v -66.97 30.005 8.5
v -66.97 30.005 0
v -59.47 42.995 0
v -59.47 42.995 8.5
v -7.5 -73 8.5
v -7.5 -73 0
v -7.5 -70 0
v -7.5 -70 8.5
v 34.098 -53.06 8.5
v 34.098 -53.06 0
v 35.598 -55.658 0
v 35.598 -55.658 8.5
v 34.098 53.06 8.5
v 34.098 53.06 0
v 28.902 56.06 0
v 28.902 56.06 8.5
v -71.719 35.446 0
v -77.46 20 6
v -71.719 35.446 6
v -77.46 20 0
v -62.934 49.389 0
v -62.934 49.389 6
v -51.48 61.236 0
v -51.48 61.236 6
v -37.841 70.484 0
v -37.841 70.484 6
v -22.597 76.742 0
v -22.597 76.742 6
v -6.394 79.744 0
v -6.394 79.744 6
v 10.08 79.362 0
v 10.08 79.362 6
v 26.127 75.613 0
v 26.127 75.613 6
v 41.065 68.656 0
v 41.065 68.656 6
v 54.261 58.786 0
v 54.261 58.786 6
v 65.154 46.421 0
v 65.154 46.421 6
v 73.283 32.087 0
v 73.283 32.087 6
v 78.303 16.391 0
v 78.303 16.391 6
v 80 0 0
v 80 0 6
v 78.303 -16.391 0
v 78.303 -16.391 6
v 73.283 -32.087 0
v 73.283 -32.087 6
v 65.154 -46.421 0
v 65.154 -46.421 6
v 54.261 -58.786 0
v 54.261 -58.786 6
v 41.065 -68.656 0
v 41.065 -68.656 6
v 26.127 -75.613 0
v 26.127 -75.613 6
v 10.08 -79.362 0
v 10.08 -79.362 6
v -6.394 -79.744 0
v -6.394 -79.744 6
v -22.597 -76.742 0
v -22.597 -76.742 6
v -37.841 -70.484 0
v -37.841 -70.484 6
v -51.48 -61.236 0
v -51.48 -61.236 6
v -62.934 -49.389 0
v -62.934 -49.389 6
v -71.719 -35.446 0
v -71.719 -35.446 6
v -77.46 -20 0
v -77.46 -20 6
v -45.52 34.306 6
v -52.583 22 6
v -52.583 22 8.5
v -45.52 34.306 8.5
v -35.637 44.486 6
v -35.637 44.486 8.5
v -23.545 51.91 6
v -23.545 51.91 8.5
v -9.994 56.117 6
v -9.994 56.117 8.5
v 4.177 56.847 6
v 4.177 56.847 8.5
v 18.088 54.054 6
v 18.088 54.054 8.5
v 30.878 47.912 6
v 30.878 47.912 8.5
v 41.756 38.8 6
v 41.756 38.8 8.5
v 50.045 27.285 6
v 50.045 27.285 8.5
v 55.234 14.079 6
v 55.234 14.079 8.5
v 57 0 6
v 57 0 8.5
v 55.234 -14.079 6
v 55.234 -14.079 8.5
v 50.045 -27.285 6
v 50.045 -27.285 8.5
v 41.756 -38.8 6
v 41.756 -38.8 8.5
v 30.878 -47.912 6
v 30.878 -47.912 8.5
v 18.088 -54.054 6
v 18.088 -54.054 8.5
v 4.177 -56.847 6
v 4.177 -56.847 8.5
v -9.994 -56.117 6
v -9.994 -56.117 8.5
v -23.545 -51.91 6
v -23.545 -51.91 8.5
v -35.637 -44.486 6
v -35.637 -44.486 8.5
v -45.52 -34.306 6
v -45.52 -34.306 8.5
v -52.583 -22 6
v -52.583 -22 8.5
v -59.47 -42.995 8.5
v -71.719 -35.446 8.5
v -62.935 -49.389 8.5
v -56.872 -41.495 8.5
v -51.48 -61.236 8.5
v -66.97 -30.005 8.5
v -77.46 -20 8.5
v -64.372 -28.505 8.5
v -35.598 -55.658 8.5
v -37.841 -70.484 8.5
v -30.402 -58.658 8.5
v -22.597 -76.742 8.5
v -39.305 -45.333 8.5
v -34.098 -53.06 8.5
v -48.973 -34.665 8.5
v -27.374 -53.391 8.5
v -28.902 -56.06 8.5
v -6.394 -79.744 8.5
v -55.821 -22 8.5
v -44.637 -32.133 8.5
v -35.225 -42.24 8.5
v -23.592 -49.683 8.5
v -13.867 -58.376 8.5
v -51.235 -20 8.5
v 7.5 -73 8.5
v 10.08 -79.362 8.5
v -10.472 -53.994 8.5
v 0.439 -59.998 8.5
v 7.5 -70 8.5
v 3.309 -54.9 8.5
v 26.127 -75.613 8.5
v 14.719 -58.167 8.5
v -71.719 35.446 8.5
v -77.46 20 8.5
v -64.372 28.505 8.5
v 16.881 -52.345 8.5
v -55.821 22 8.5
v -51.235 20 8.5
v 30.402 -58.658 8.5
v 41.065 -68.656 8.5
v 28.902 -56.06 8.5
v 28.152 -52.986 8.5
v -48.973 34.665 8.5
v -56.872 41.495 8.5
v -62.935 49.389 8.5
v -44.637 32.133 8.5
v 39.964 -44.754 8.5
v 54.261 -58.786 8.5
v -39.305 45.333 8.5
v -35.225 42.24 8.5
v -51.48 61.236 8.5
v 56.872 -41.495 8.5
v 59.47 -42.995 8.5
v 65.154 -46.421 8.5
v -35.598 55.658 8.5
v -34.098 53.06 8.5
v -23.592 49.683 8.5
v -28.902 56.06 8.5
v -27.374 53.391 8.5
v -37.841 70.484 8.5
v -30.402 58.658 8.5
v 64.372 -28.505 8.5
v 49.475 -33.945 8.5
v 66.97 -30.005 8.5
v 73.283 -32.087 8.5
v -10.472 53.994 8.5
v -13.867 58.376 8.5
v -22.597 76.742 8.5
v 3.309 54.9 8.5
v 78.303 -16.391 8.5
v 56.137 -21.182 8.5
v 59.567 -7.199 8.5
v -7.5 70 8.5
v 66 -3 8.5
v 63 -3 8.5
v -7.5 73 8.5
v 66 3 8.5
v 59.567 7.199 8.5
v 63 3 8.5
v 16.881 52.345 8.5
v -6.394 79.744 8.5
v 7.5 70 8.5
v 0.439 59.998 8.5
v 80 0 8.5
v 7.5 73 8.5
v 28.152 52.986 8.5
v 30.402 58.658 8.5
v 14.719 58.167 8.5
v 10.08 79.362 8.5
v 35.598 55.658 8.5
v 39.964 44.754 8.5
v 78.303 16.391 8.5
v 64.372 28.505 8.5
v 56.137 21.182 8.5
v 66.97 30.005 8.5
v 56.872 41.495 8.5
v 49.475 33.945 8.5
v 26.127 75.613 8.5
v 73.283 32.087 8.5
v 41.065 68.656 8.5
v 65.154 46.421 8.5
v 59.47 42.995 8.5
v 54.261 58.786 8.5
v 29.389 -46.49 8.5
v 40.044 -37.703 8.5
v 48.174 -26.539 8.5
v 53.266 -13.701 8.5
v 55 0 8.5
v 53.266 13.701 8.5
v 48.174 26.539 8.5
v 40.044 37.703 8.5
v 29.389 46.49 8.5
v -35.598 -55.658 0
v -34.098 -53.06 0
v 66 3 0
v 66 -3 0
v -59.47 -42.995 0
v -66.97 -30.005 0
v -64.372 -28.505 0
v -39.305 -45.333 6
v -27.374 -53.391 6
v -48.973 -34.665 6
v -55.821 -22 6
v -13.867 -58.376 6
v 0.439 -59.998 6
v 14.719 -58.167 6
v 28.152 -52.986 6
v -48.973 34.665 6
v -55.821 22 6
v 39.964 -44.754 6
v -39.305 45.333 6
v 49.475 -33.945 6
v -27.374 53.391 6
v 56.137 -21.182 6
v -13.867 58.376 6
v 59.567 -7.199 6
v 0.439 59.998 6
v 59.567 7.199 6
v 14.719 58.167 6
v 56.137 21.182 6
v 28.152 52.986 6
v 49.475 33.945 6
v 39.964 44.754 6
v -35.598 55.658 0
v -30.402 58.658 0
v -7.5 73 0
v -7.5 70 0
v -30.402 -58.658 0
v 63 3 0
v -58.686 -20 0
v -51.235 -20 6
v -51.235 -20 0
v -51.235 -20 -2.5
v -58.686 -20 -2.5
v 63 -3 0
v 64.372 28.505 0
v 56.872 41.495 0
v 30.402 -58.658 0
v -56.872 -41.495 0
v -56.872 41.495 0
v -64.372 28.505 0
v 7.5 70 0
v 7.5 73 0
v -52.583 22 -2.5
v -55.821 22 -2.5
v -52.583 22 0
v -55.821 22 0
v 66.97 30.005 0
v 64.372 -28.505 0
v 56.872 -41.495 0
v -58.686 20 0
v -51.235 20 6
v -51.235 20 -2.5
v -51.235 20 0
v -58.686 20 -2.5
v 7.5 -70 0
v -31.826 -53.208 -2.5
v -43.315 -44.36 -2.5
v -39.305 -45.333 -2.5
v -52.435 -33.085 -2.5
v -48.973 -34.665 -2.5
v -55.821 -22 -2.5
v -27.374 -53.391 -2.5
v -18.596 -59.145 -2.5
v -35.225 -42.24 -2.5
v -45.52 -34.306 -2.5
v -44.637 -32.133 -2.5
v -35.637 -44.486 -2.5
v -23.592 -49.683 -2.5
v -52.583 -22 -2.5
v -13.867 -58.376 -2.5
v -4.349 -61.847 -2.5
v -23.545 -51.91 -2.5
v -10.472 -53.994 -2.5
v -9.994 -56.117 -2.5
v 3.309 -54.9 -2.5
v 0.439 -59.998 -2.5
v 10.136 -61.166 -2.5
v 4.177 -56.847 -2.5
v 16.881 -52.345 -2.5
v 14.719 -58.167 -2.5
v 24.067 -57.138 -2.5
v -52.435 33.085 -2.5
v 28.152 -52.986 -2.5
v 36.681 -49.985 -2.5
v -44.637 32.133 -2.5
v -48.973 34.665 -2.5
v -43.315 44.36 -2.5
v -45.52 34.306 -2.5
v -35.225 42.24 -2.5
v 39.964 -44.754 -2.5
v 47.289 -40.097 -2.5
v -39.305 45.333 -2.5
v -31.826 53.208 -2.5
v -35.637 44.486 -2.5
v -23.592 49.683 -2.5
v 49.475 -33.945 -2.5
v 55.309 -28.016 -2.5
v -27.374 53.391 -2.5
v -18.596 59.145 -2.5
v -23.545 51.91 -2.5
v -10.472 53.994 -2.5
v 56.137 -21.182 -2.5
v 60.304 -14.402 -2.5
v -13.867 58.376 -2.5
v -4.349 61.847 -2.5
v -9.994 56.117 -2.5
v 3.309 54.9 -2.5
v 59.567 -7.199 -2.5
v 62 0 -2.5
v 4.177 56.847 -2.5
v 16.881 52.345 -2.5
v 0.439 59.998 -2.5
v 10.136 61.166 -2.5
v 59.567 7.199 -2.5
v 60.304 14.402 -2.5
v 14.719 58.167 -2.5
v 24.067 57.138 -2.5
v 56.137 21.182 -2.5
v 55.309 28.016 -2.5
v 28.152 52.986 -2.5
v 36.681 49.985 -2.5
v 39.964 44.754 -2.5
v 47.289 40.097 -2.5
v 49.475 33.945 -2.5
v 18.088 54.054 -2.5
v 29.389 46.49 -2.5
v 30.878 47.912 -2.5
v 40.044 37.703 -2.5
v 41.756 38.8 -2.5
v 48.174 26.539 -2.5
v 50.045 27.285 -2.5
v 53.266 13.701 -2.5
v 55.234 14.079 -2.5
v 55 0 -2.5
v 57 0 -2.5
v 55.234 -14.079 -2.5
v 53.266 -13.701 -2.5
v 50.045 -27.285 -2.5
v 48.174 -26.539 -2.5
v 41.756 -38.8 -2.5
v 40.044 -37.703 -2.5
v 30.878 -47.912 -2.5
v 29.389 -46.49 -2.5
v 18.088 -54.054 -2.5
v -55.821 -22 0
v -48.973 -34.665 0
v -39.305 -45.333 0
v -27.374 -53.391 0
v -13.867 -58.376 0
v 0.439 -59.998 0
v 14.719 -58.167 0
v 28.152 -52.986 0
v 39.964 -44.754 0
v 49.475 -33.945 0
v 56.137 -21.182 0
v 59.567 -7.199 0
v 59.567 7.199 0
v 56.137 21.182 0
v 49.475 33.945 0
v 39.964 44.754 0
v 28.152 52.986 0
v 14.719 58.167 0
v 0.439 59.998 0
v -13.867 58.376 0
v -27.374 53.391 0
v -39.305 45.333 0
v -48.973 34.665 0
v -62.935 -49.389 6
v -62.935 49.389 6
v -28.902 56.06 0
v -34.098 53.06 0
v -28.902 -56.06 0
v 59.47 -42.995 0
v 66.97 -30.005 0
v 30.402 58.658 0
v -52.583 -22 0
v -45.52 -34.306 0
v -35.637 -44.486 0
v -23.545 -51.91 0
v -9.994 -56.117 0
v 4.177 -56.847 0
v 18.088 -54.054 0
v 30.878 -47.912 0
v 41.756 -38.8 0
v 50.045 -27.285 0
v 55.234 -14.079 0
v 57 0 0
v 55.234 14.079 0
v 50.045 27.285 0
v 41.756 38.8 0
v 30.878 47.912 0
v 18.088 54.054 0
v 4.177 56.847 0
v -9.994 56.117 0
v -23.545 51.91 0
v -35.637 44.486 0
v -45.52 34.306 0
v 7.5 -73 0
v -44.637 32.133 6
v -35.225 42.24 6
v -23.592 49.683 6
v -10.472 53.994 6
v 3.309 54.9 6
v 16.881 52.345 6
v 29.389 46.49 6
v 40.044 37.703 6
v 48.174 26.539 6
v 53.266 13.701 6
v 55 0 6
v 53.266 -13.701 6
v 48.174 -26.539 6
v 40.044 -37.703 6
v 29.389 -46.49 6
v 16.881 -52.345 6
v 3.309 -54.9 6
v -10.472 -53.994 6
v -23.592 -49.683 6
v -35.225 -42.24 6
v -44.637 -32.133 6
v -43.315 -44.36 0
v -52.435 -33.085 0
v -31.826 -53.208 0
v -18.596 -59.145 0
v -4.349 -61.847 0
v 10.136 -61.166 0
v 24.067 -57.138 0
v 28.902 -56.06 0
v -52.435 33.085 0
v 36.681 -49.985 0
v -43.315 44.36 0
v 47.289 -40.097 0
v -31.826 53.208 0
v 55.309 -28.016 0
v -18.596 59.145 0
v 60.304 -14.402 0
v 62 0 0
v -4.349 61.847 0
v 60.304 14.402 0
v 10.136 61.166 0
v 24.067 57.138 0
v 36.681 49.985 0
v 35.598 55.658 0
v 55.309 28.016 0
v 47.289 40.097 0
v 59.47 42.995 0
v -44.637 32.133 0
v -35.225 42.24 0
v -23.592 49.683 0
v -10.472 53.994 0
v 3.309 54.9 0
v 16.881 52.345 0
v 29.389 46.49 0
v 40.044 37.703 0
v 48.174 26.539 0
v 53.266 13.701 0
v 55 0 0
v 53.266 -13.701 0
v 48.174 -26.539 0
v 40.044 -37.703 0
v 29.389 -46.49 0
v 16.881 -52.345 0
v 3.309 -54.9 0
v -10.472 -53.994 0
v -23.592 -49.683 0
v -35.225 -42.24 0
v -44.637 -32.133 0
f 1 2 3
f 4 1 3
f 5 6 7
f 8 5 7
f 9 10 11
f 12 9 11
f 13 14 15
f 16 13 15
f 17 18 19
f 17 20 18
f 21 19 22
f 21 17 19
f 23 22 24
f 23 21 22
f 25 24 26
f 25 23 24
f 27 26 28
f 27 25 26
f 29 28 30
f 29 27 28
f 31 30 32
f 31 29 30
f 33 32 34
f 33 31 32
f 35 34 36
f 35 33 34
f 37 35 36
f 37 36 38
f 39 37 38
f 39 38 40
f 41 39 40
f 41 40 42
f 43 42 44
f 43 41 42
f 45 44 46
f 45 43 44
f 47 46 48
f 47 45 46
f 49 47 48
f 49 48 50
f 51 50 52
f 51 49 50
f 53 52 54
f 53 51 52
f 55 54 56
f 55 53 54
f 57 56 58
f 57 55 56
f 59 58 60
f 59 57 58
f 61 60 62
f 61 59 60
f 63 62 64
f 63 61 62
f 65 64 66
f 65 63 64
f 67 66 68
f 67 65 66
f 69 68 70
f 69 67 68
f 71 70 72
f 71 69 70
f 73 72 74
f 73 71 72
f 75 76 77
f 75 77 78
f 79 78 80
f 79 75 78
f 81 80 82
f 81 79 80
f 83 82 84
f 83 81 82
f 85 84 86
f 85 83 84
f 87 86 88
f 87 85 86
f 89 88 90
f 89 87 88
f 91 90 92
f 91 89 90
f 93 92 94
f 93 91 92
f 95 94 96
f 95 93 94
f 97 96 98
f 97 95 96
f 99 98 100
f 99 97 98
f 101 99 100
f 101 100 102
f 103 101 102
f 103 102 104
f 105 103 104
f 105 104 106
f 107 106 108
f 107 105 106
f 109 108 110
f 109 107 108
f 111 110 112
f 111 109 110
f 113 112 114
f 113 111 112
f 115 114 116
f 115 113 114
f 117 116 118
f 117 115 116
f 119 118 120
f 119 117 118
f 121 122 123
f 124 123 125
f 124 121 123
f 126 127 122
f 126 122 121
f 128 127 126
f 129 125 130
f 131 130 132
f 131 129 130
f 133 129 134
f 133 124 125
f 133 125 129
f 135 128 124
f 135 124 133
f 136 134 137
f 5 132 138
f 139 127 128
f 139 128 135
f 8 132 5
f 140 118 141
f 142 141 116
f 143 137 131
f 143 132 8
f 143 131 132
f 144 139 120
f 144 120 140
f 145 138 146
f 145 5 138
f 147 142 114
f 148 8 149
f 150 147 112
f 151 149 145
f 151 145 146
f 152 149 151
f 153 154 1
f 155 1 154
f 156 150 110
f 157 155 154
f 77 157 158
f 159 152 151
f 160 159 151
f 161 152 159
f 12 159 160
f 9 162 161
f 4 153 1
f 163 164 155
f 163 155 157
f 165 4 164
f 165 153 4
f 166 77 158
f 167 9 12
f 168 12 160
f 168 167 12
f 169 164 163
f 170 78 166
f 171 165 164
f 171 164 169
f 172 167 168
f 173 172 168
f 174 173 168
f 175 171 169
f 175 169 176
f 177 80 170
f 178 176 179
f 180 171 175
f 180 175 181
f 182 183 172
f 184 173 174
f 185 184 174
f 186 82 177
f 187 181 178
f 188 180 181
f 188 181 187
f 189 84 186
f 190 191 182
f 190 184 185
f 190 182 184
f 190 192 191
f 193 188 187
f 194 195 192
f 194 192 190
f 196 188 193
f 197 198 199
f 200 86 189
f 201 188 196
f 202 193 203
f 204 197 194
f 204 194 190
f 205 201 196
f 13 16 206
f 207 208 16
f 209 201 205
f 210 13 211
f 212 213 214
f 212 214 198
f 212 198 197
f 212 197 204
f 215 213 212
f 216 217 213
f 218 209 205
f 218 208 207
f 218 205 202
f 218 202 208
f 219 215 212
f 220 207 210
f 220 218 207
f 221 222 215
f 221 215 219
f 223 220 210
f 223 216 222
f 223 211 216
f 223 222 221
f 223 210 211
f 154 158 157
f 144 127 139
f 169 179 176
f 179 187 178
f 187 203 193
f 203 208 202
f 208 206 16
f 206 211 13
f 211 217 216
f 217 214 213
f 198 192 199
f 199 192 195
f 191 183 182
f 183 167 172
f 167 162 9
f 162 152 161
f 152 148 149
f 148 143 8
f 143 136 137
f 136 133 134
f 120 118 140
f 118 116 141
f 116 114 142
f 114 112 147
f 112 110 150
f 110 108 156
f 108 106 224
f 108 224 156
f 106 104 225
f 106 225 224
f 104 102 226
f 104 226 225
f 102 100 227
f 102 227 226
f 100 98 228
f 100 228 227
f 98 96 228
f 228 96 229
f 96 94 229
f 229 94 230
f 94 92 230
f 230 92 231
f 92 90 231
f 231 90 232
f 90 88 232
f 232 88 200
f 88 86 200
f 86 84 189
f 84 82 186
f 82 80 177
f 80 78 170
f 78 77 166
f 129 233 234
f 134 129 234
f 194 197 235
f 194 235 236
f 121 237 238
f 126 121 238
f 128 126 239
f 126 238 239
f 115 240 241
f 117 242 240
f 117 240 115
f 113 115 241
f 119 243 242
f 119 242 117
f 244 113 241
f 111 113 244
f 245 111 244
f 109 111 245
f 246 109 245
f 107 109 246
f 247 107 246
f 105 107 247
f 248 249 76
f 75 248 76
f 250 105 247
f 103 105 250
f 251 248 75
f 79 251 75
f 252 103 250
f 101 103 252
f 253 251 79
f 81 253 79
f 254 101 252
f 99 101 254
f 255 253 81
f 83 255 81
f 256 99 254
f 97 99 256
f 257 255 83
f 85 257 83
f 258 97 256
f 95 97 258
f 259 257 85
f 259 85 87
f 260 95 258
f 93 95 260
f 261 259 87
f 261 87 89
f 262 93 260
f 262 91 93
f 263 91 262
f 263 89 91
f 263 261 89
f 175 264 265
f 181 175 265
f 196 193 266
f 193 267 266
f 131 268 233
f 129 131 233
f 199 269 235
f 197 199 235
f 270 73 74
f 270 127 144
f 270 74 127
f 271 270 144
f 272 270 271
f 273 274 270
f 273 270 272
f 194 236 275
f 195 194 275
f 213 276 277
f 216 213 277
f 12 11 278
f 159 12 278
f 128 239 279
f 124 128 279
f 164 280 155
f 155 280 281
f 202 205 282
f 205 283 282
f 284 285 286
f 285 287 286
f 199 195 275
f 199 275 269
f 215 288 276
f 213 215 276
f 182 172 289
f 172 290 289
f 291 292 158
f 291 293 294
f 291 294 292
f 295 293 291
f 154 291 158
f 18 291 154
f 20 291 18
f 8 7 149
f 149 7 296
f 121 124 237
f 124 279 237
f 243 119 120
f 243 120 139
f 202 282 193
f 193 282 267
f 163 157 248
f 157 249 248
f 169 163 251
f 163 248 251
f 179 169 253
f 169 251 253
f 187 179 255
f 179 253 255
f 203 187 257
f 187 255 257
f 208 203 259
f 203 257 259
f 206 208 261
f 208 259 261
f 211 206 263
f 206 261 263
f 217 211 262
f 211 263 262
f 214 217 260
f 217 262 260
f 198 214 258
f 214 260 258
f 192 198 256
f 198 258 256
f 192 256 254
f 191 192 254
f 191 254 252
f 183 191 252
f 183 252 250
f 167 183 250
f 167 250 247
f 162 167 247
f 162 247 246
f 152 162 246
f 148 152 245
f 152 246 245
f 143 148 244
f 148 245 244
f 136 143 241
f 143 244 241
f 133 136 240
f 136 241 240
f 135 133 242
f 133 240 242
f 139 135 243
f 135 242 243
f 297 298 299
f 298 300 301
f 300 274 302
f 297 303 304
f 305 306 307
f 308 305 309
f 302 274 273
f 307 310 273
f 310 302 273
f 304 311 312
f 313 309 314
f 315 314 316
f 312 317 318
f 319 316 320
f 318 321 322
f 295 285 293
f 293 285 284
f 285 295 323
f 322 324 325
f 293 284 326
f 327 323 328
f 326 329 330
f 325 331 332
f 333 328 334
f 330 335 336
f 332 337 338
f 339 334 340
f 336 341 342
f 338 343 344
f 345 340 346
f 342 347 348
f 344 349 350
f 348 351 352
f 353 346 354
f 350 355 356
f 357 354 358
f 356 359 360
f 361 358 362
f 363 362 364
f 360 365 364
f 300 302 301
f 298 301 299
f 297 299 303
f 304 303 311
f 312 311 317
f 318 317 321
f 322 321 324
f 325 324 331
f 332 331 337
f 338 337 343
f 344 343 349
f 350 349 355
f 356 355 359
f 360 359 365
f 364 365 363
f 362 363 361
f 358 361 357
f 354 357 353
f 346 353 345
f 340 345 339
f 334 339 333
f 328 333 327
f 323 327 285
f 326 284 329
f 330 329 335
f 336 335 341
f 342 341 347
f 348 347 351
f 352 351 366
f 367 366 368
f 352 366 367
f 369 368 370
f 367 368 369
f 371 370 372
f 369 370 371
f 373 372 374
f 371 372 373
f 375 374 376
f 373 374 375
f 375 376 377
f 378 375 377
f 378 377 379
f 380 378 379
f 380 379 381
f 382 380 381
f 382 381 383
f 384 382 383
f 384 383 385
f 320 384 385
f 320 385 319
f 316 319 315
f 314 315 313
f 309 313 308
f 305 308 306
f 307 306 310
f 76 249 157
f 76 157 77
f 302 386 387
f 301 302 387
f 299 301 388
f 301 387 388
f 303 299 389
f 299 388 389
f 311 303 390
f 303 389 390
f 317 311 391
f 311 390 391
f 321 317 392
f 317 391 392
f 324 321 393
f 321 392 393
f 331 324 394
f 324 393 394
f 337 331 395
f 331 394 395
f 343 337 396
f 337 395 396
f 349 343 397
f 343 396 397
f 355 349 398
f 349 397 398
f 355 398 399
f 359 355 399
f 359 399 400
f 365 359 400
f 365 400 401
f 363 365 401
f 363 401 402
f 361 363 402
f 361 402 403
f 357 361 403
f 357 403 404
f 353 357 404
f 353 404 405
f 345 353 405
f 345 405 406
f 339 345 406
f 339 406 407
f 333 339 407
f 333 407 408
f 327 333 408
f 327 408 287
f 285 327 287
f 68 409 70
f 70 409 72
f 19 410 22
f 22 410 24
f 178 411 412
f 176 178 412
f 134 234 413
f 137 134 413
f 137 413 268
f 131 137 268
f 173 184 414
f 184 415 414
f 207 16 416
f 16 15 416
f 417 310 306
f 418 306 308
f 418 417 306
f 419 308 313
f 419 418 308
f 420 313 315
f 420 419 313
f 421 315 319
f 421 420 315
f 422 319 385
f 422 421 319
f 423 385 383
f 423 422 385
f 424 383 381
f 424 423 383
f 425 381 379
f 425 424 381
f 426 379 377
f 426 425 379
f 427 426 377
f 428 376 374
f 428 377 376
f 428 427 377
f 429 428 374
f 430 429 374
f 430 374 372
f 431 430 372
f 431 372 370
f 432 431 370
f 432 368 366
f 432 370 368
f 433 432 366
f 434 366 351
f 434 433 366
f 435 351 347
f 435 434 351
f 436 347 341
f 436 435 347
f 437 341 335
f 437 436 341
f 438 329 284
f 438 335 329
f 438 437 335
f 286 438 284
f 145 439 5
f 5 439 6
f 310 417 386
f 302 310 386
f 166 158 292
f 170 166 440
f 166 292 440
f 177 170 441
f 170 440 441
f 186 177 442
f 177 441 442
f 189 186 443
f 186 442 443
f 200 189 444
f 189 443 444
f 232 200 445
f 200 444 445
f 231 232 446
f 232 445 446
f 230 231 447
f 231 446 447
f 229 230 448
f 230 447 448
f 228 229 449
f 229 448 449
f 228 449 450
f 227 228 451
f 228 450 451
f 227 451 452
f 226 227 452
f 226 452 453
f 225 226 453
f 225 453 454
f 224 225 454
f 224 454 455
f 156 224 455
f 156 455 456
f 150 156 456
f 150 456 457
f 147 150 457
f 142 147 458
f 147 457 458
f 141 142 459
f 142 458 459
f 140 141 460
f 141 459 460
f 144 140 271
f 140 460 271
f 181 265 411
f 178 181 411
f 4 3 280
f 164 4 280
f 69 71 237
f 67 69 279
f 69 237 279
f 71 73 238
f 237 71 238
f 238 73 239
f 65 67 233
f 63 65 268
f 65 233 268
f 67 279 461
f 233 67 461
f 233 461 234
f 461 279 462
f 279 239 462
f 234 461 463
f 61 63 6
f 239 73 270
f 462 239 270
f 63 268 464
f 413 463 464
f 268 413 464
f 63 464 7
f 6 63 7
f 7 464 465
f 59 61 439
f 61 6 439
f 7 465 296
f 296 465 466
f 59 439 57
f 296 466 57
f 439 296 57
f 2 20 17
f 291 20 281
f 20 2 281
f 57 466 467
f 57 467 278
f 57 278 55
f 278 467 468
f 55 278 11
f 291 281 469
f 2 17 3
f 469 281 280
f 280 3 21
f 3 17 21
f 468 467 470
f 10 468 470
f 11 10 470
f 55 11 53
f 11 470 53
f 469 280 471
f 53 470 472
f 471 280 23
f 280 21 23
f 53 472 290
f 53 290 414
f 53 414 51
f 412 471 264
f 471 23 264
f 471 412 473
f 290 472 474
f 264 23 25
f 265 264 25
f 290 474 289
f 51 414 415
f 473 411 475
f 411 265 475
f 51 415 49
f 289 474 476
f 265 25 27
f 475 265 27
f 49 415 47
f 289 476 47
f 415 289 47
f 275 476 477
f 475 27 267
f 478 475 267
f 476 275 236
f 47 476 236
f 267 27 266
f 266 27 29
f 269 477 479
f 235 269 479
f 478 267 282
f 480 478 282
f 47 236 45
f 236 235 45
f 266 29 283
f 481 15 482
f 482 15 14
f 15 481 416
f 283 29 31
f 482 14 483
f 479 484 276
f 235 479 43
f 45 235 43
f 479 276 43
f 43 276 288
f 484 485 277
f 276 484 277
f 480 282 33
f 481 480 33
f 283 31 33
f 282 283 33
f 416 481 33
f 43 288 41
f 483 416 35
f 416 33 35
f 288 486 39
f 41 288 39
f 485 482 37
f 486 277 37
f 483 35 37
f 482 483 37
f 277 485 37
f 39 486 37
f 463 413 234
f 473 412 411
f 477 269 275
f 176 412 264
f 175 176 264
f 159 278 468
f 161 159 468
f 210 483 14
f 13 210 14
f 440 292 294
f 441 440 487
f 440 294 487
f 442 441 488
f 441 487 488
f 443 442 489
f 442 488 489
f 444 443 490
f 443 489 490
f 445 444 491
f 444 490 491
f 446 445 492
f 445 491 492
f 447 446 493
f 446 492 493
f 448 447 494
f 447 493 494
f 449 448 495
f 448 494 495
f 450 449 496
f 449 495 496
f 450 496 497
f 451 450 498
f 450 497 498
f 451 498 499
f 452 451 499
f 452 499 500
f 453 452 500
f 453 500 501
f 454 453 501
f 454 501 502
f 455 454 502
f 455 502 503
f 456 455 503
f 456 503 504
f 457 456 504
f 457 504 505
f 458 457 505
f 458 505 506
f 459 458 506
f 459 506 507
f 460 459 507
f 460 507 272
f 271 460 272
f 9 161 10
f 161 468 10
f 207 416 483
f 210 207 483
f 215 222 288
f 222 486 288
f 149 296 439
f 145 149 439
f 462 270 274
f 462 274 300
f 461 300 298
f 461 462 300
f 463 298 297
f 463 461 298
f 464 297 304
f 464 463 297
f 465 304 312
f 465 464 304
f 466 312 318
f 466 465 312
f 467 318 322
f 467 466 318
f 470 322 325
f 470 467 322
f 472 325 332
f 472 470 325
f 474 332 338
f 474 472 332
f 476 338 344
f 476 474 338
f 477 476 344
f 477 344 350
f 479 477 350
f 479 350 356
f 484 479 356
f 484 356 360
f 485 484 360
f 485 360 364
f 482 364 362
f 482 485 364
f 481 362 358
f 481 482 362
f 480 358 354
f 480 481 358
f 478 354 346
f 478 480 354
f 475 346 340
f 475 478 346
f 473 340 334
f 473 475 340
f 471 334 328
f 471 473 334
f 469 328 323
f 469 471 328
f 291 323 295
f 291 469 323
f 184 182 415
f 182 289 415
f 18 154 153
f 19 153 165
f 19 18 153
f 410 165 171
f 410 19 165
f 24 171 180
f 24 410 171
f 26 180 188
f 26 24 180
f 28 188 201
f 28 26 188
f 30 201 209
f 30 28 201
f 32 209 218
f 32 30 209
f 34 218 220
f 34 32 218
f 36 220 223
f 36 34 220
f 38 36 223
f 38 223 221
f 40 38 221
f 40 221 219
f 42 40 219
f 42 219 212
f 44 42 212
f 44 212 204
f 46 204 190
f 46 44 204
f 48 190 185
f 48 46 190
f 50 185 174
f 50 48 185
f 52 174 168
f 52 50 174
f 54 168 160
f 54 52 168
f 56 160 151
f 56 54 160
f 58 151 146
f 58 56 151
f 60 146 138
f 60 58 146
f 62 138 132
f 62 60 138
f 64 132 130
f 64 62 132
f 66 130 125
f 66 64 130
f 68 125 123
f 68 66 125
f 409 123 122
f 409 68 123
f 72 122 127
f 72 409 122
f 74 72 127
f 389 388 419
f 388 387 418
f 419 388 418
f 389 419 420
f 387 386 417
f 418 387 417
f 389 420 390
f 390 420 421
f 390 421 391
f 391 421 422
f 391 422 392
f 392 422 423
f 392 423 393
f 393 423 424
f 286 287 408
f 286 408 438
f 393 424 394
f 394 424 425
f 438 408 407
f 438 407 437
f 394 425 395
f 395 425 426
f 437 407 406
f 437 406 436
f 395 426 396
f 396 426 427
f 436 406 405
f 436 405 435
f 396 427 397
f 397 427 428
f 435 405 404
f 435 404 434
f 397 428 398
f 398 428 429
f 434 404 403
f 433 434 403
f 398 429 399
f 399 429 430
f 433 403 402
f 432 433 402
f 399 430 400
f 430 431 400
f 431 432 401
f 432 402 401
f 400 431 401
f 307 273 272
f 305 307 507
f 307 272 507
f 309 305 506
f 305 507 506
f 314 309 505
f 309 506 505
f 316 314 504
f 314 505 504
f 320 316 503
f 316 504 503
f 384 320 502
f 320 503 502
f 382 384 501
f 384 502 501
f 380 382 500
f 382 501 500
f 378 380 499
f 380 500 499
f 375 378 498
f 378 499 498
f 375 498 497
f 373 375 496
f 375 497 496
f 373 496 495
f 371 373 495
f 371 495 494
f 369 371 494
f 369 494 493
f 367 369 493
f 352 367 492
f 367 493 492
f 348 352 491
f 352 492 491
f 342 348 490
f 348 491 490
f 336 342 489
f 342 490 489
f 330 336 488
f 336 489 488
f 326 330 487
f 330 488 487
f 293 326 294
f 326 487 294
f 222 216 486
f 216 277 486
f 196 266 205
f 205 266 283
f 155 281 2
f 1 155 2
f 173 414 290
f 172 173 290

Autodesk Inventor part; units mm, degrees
ref_plane "YZ Plane" through (0, 0, 0) normal (1, 0, 0) x (0, 1, 0)
ref_plane "XZ Plane" through (0, 0, 0) normal (0, 1, 0) x (-1, 0, 0)
ref_plane "XY Plane" through (0, 0, 0) normal (0, 0, 1) x (1, 0, 0)
sketch "Sketch1" plane through (0, 0, 0) normal (0, 0, 1) x (1, 0, 0)
  circle A0 centre (0, 0) radius 80
  circle A1 centre (0, 0) radius 55
  line L0 (-7.5, 73) -> (7.5, 73)
  line L1 (7.5, 73) -> (7.5, 70)
  line L2 (7.5, 70) -> (-7.5, 70)
  line L3 (-7.5, 70) -> (-7.5, 73)
  line L4 (-66.9699, 30.0048) -> (-59.4699, 42.9952)
  line L5 (-59.4699, 42.9952) -> (-56.8718, 41.4952)
  line L6 (-56.8718, 41.4952) -> (-64.3718, 28.5048)
  line L7 (-64.3718, 28.5048) -> (-66.9699, 30.0048)
  line L8 (-59.4699, -42.9952) -> (-66.9699, -30.0048)
  line L9 (-66.9699, -30.0048) -> (-64.3718, -28.5048)
  line L10 (-64.3718, -28.5048) -> (-56.8718, -41.4952)
  line L11 (-56.8718, -41.4952) -> (-59.4699, -42.9952)
  line L12 (7.5, -73) -> (-7.5, -73)
  line L13 (-7.5, -73) -> (-7.5, -70)
  line L14 (-7.5, -70) -> (7.5, -70)
  line L15 (7.5, -70) -> (7.5, -73)
  line L16 (66.9699, -30.0048) -> (59.4699, -42.9952)
  line L17 (59.4699, -42.9952) -> (56.8718, -41.4952)
  line L18 (56.8718, -41.4952) -> (64.3718, -28.5048)
  line L19 (64.3718, -28.5048) -> (66.9699, -30.0048)
  line L20 (59.4699, 42.9952) -> (66.9699, 30.0048)
  line L21 (66.9699, 30.0048) -> (64.3718, 28.5048)
  line L22 (64.3718, 28.5048) -> (56.8718, 41.4952)
  line L23 (56.8718, 41.4952) -> (59.4699, 42.9952)
  line L24 (-58.1708, 43.7452) -> (-43.1708, 43.7452)
  line L25 (-43.1708, 43.7452) -> (-43.1708, 40.7452)
  line L26 (-43.1708, 40.7452) -> (-58.1708, 40.7452)
  line L27 (-58.1708, 40.7452) -> (-58.1708, 43.7452)
  line L28 (-58.1708, -40.7452) -> (-43.1708, -40.7452)
  line L29 (-43.1708, -40.7452) -> (-43.1708, -43.7452)
  line L30 (-43.1708, -43.7452) -> (-58.1708, -43.7452)
  line L31 (-58.1708, -43.7452) -> (-58.1708, -40.7452)
  line L32 (0, 20) -> (-100, 20)
  line L33 (-100, 20) -> (-100, -20)
  line L34 (-100, -20) -> (0, -20)
  line L35 (0, -20) -> (0, 20)
  point P0 (0, 73)
  point P1 (7.5, 71.5)
  point P2 (0, 70)
  point P3 (-63.2199, 36.5)
  point P4 (-58.1708, 42.2452)
  point P5 (-60.6218, 35)
  point P6 (-63.2199, -36.5)
  point P7 (-65.6708, -29.2548)
  point P8 (-60.6218, -35)
  point P9 (0, -73)
  point P10 (-7.5, -71.5)
  point P11 (0, -70)
  point P12 (63.2199, -36.5)
  point P13 (58.1708, -42.2452)
  point P14 (60.6218, -35)
  point P15 (63.2199, 36.5)
  point P16 (65.6708, 29.2548)
  point P17 (60.6218, 35)
  point P18 (-58.1708, 42.2452)
  point P19 (-58.1708, -42.2452)
  point P20 (-51.2348, -20)
  point P21 (-77.4597, -20)
  point P22 (-77.4597, 20)
  point P23 (-51.2348, 20)
  dimension "d0" = 160
  dimension "d1" = 110
  dimension "d2" = 15
  dimension "d3" = 3
  dimension "d11" = 70
  dimension "d14" = 360
  dimension "d18" = 15
  dimension "d19" = 3
  dimension "d20" = 15
  dimension "d21" = 3
  dimension "d22" = 40
  dimension "d23" = 100
extrude "Extrusion2" add sketch "Sketch1" along normal blind 6 contours A0 L34 A1 L32 | L27 L24 L25 L26 L6 L5 | L11 L10 L28 L29 L30 L31 picked at (16.7927, -65.9701)
sketch "草圖2" plane through (0, 0, 6) normal (0, 0, 1) x (1, 0, 0)
  arc A0 (-51.2348, -20) -> (-51.2348, 20) centre (0, 0) ccw projected
  circle A1 centre (0, 0) radius 55
  circle A2 centre (0, 0) radius 57
  circle A3 centre (0, 0) radius 60
  circle A4 centre (0, 0) radius 62
  arc A5 (-77.4597, -20) -> (-77.4597, 20) centre (0, 0) ccw projected
  line L0 (-51.2348, 20) -> (-77.4597, 20)
  line L1 (-51.2348, -20) -> (-77.4597, -20) projected
  line L2 (-51.2348, -20) -> (-77.4597, -20)
  line L3 (-51.2348, 20) -> (-77.4597, 20)
  line L4 (-77.4597, 20) -> (-77.4597, 22)
  line L5 (-77.4597, 22) -> (-51.2348, 22)
  line L6 (-51.2348, 22) -> (-51.2348, 20)
  line L7 (-77.4597, -20) -> (-51.2348, -20)
  line L8 (-51.2348, -20) -> (-51.2348, -22)
  line L9 (-51.2348, -22) -> (-77.4597, -22)
  line L10 (-77.4597, -22) -> (-77.4597, -20)
  point P0 (-58.6856, 20)
  point P1 (-58.6856, -20)
  point P2 (-55.8211, 22)
  point P3 (-55.8211, -22)
  point P4 (-52.5833, -22)
  point P5 (-52.5833, 22)
  point P6 (-57.9655, -22)
  point P7 (-76.9155, -22)
  point P8 (-76.9155, 22)
  point P9 (-57.9655, 22)
  dimension "d24" = 114
  dimension "d25" = 120
  dimension "d26" = 124
  dimension "d27" = 2
  dimension "d28" = 26.2249
  dimension "d29" = 2
  dimension "d30" = 26.2249
extrude "擠出3" add sketch "草圖2" against normal blind 8.5 contours L8 L9 A2 L1 | A0 L6 L5 A2 L9 L8 | L0 A2 L5 L6 | A2 L9 A3 L1 | L0 A3 L5 A2 | A3 L9 A4 L1 | L0 A4 L5 A3 | A3 L5 A4 L9
extrude "擠出4" add sketch "草圖2" along normal blind 2.5 contours L8 L9 A2 L1 | A0 L6 L5 A2 L9 L8 | L0 A2 L5 L6 | A2 L9 A3 L1 | L0 A3 L5 A2 | A3 L9 A4 L1 | L0 A4 L5 A3 | A3 L5 A4 L9 | A4 L9 A5 L1 | L0 A5 L5 A4 | A4 L5 A5 L9
sketch "草圖3" plane through (0, 0, 0) normal (0, 0, -1) x (-1, 0, 0)
  line L0 (-63, 3) -> (-66, 3)
  line L1 (-66, 3) -> (-66, -3)
  line L2 (-66, -3) -> (-63, -3)
  line L3 (-63, -3) -> (-63, 3)
  line L4 (-34.0981, -53.0596) -> (-35.5981, -55.6577)
  line L5 (-35.5981, -55.6577) -> (-30.4019, -58.6577)
  line L6 (-30.4019, -58.6577) -> (-28.9019, -56.0596)
  line L7 (-28.9019, -56.0596) -> (-34.0981, -53.0596)
  line L8 (28.9019, -56.0596) -> (30.4019, -58.6577)
  line L9 (30.4019, -58.6577) -> (35.5981, -55.6577)
  line L10 (35.5981, -55.6577) -> (34.0981, -53.0596)
  line L11 (34.0981, -53.0596) -> (28.9019, -56.0596)
  line L12 (63, -3) -> (66, -3)
  line L13 (66, -3) -> (66, 3)
  line L14 (66, 3) -> (63, 3)
  line L15 (63, 3) -> (63, -3)
  line L16 (34.0981, 53.0596) -> (35.5981, 55.6577)
  line L17 (35.5981, 55.6577) -> (30.4019, 58.6577)
  line L18 (30.4019, 58.6577) -> (28.9019, 56.0596)
  line L19 (28.9019, 56.0596) -> (34.0981, 53.0596)
  line L20 (-28.9019, 56.0596) -> (-30.4019, 58.6577)
  line L21 (-30.4019, 58.6577) -> (-35.5981, 55.6577)
  line L22 (-35.5981, 55.6577) -> (-34.0981, 53.0596)
  line L23 (-34.0981, 53.0596) -> (-28.9019, 56.0596)
  point P0 (0, 0)
  point P1 (-63, 0)
  point P2 (-31.5, -54.5596)
  point P3 (31.5, -54.5596)
  point P4 (63, 0)
  point P5 (31.5, 54.5596)
  point P6 (-31.5, 54.5596)
  dimension "d35" = 3
  dimension "d36" = 6
  dimension "d38" = 63
  dimension "d39" = 3
  dimension "d44" = 360
extrude "擠出5" cut sketch "草圖3" against normal through all contours L3 L2 L1 L0 | L7 L6 L5 L4 | L11 L10 L9 L8 | L19 L18 L17 L16 | L23 L22 L21 L20
extrude "擠出6" cut sketch "Sketch1" along normal through all contours L0 L1 L2 L3 | L4 L5 L27 L26 L6 L7 | L5 L6 L26 L27 | L8 L9 L10 L28 L31 L11 | L31 L28 L10 L11 | L12 L13 L14 L15 | L16 L17 L18 L19 | L20 L21 L22 L23
properties part number "back_cir_hold"
